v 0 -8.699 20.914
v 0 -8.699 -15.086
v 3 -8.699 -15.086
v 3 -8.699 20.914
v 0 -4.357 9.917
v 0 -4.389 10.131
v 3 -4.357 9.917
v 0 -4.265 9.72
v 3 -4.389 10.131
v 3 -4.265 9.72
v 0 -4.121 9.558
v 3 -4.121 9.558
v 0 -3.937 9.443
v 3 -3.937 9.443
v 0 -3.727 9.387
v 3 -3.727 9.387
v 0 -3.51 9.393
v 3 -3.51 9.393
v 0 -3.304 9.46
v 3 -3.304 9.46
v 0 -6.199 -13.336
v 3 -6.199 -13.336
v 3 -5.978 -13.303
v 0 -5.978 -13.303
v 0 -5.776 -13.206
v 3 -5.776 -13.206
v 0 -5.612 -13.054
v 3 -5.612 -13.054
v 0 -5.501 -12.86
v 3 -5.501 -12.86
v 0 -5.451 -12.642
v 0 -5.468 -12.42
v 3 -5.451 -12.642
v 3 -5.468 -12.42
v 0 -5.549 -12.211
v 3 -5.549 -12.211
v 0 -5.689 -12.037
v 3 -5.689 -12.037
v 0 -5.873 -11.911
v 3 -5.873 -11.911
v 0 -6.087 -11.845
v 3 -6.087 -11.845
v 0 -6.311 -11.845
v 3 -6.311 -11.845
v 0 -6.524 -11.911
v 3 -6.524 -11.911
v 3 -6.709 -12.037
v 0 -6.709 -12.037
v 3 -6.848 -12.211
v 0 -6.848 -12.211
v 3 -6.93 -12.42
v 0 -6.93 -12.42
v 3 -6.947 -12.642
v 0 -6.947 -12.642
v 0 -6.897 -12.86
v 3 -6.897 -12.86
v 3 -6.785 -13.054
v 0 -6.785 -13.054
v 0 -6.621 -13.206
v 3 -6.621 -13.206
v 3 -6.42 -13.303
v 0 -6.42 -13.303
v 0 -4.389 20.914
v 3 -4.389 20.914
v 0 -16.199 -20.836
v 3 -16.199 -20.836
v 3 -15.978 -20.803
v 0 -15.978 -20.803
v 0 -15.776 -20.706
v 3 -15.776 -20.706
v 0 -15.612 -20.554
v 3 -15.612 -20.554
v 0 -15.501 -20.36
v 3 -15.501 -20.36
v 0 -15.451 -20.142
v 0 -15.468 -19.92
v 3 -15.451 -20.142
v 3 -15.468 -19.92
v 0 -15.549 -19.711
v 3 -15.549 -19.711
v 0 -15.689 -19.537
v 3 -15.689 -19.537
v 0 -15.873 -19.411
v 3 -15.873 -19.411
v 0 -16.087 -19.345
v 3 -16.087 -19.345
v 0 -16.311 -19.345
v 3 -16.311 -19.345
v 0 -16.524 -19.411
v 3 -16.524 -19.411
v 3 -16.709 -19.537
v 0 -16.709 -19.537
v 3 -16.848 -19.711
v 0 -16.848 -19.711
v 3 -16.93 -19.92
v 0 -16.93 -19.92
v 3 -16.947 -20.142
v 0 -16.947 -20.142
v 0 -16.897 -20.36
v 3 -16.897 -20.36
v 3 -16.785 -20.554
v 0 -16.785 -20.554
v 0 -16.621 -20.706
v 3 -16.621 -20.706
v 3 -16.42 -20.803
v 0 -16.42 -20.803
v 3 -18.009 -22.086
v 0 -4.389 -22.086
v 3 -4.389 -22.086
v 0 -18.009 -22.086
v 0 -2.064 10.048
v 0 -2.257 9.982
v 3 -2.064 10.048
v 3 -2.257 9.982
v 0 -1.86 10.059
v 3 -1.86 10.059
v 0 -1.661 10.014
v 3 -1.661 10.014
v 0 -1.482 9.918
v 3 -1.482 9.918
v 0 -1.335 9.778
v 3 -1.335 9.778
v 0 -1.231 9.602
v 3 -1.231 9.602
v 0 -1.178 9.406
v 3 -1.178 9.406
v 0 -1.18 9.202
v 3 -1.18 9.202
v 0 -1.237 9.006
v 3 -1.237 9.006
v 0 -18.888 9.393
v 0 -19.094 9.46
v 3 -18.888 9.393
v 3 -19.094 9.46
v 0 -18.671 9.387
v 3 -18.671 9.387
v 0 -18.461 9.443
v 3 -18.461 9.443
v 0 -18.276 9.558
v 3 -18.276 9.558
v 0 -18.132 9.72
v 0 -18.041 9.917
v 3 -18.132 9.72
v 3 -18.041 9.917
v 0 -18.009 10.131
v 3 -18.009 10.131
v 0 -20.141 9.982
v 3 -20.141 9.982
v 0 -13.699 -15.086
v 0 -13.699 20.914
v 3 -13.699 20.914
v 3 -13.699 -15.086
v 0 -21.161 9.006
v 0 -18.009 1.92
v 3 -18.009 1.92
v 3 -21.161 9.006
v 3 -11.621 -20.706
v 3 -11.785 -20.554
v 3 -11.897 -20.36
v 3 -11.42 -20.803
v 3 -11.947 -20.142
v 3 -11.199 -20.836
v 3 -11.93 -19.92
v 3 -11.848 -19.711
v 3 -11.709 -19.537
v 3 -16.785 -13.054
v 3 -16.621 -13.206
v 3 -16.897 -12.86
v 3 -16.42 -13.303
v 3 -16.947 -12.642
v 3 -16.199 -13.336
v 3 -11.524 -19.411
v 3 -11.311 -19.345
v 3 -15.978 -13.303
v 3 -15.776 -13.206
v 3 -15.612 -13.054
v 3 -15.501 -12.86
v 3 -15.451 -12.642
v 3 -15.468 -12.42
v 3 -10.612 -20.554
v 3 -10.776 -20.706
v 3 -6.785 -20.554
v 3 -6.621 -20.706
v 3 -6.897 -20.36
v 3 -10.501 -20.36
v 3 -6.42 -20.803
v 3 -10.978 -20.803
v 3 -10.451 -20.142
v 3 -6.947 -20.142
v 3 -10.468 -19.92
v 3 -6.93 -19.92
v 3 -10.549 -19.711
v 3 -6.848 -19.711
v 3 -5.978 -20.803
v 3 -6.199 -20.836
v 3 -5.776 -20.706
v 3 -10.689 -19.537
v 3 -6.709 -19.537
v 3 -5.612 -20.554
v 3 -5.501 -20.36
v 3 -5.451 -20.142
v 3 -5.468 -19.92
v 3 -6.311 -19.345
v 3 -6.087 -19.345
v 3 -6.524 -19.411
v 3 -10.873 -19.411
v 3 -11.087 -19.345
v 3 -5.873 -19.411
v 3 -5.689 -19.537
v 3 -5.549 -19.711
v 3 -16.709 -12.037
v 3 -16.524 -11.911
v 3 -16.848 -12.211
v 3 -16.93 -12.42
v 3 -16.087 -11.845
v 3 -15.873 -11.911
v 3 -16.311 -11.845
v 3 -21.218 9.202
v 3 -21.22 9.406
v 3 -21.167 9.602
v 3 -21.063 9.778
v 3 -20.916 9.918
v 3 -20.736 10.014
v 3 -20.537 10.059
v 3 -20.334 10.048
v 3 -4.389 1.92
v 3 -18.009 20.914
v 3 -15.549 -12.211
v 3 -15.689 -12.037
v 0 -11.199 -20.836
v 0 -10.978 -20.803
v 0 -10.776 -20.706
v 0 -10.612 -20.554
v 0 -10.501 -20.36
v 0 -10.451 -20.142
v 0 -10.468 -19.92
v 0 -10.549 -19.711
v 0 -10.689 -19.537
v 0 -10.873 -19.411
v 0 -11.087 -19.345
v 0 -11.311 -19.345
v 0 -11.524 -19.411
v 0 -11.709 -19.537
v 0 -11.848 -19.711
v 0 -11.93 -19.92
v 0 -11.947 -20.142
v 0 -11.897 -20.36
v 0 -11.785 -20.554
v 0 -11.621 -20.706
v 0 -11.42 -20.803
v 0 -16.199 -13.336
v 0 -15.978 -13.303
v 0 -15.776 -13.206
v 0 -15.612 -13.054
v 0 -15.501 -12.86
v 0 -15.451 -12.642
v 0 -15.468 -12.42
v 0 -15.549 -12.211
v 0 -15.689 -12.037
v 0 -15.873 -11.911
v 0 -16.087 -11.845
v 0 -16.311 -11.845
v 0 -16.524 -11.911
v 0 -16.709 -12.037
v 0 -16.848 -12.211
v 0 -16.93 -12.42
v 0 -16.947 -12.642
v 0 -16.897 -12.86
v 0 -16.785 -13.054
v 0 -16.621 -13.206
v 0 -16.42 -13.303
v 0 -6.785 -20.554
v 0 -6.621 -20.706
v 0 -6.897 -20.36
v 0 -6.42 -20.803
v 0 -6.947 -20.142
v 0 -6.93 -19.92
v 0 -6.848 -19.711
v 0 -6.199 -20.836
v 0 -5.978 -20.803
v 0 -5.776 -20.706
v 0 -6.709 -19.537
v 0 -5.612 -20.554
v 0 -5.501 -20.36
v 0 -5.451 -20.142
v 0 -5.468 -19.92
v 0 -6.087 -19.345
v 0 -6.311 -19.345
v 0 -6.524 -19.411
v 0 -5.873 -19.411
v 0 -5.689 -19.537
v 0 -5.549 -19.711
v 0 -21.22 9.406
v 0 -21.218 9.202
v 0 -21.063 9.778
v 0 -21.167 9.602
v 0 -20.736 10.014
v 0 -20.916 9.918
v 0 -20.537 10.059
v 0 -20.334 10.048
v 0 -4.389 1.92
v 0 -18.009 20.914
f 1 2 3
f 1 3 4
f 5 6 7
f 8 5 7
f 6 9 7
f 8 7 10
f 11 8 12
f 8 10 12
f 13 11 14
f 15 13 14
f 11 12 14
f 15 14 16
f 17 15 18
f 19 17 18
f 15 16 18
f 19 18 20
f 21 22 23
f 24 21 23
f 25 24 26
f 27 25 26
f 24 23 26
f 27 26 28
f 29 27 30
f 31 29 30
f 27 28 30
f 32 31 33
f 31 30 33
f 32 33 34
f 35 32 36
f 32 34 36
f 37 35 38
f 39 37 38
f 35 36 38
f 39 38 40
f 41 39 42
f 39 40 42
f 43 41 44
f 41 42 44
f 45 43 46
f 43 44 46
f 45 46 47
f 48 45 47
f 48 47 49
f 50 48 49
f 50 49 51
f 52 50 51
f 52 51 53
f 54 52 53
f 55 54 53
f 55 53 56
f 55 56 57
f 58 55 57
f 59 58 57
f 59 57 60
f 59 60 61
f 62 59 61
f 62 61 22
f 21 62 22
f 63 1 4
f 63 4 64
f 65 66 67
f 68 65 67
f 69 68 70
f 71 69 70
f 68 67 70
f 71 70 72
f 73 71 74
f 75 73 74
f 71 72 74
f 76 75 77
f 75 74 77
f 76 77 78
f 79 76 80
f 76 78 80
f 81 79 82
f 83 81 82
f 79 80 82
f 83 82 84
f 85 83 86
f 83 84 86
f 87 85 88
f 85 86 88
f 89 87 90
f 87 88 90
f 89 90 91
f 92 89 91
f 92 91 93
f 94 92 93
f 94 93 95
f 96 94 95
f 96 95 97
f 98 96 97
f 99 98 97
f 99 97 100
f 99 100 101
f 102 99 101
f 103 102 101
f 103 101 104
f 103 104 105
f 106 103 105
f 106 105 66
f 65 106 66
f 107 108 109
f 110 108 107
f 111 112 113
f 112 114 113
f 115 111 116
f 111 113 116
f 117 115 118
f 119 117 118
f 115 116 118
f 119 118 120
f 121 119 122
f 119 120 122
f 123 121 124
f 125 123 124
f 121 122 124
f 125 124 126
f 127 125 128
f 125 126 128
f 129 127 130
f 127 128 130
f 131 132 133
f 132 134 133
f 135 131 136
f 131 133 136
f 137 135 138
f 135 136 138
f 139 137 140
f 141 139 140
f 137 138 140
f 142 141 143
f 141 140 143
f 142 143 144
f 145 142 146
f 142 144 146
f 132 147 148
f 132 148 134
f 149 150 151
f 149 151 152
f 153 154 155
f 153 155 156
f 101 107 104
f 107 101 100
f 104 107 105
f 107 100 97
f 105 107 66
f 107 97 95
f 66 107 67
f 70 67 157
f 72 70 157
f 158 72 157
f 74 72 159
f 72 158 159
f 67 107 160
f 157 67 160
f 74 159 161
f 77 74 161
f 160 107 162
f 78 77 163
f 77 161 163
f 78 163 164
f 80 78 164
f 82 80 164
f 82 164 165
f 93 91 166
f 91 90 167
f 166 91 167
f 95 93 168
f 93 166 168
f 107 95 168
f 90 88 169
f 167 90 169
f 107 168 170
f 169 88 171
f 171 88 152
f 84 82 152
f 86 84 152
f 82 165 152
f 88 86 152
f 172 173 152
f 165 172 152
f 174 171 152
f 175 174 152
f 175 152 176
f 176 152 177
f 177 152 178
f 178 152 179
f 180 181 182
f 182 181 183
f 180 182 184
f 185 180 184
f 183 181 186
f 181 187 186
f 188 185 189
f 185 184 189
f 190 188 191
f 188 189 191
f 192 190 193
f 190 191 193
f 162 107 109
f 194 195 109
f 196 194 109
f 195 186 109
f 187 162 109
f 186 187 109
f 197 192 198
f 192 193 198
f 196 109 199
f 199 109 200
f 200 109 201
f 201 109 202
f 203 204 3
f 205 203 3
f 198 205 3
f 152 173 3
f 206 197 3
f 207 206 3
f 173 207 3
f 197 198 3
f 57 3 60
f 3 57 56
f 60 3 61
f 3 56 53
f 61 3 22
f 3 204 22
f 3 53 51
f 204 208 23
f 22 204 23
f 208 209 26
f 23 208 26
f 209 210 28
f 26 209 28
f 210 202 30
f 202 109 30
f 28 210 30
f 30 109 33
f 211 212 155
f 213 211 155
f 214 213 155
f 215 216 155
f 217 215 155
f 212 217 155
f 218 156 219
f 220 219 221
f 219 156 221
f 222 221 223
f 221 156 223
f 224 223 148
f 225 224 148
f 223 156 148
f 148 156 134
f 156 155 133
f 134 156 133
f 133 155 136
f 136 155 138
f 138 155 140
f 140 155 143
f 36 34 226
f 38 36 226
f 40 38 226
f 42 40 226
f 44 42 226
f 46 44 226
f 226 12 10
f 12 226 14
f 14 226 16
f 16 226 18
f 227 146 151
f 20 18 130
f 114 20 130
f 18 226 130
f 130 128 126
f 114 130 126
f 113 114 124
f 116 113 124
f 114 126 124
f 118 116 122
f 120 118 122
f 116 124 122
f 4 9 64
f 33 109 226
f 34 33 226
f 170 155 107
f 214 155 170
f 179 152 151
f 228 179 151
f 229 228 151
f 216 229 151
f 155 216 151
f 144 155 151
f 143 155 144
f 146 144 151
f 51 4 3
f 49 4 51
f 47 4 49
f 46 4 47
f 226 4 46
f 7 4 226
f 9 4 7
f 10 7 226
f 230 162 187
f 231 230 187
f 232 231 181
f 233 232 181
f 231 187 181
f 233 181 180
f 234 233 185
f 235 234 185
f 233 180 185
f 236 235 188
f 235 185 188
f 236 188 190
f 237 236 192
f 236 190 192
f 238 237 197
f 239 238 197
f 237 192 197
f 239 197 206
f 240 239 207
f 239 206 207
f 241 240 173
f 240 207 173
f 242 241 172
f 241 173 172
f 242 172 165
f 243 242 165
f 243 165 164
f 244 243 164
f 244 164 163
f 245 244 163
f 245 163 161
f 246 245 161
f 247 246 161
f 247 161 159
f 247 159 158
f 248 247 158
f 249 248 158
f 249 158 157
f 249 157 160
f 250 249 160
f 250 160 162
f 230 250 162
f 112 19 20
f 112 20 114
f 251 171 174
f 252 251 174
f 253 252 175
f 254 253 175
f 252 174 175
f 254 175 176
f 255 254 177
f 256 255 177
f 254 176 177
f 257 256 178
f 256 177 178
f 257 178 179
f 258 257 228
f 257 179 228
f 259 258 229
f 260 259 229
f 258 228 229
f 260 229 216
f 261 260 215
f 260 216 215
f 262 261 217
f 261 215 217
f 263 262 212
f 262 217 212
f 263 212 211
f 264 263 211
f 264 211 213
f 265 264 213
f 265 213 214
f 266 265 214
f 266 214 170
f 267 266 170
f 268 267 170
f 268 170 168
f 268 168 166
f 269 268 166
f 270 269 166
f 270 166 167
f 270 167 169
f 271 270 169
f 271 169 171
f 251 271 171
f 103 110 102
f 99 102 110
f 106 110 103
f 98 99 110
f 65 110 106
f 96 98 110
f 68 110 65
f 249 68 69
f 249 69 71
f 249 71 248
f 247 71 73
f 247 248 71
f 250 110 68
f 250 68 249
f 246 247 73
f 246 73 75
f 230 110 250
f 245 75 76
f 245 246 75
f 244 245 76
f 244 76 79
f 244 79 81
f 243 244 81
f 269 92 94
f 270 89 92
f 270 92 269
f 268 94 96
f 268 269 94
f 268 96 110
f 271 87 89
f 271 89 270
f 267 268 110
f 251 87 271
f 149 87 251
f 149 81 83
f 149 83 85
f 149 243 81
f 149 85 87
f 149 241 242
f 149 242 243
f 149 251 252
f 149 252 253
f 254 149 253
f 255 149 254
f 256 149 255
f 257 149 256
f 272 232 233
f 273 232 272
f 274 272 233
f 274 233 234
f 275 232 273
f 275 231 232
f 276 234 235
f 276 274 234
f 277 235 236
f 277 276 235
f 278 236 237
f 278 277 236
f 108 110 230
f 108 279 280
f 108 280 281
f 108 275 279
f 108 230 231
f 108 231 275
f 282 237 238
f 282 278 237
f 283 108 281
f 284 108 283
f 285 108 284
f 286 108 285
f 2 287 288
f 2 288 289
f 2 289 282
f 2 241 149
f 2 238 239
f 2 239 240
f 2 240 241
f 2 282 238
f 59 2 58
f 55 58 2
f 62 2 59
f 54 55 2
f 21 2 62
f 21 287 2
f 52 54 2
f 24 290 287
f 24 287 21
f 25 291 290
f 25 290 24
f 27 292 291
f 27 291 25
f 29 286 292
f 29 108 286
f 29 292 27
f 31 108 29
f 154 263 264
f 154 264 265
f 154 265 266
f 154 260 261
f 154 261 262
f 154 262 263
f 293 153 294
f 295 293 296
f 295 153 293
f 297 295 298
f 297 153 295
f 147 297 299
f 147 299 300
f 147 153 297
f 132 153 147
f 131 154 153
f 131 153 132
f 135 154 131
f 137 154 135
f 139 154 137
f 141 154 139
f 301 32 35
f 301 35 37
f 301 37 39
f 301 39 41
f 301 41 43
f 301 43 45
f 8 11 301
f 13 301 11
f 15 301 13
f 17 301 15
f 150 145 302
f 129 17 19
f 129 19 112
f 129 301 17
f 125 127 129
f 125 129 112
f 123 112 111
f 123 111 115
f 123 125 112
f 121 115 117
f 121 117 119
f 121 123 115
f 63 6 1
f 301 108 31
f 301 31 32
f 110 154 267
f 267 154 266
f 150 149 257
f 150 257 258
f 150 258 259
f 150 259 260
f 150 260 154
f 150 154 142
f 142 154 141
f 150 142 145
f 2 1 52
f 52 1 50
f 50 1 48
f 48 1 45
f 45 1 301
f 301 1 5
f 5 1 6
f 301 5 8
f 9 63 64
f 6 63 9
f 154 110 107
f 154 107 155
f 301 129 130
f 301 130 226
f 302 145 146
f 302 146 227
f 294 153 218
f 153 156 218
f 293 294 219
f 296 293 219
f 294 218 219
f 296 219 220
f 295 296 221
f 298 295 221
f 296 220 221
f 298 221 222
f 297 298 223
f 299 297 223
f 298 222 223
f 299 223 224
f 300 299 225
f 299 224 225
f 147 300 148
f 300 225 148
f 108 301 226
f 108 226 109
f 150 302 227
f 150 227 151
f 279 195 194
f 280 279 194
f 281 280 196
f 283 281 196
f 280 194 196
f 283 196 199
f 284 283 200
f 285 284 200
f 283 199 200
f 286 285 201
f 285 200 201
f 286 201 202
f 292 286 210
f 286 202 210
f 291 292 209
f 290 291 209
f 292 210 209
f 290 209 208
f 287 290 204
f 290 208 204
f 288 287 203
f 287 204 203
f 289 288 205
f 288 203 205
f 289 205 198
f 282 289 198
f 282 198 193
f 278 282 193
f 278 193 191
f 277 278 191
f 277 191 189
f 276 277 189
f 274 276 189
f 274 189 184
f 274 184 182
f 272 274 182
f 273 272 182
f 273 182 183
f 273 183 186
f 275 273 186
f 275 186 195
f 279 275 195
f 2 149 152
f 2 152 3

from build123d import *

# Parameters (mm, degrees)
BOSS_EXTRUDE1_DEPTH = 3
FILLET1_R           = 0.75
SKETCH3_R           = 0.75
CUT_EXTRUDE1_DEPTH  = 4


with BuildPart() as part:
    # Sketch2 → Boss-Extrude1 (new body)
    with BuildSketch(Plane(origin=(0, 0, 0), x_dir=(0, 0, -1), z_dir=(1, 0, 0))):
        Polygon((-20.913575794, -4.388518255), (-8.919601915, -4.388518255), (-10.913575794, -0.388518255), (-1.919601915, -4.388518255), (22.086424206, -4.388518255), (22.086424206, -18.00920791), (-1.919601915, -18.00920791), (-10.913575794, -22.00920791), (-8.919601915, -18.00920791), (-20.913575794, -18.00920791), (-20.913575794, -13.698863083), (15.086424206, -13.698863083), (15.086424206, -8.698863083), (-20.913575794, -8.698863083), align=None)
    extrude(amount=BOSS_EXTRUDE1_DEPTH)

    # Fillet1
    fillet1_edges = [part.edges().sort_by_distance(p)[0] for p in [
        (1.5, -4.388518255, 8.919601915),
        (1.5, -0.388518255, 10.913575794),
        (1.5, -22.00920791, 10.913575794),
        (1.5, -18.00920791, 8.919601915),
    ]]
    fillet(fillet1_edges, radius=FILLET1_R)

    # Sketch3 → Cut-Extrude1 (cut, through all)
    with BuildSketch(Plane(origin=(3, 0, 0), x_dir=(0, 0, -1), z_dir=(1, 0, 0))):
        with Locations((20.086424206, -6.198863083)):
            Circle(SKETCH3_R)
        with Locations((20.086424206, -16.198863083)):
            Circle(SKETCH3_R)
        with Locations((20.086424206, -11.198863083)):
            Circle(SKETCH3_R)
        with Locations((12.586424206, -6.198863083)):
            Circle(SKETCH3_R)
        with Locations((12.586424206, -16.198863083)):
            Circle(SKETCH3_R)
    extrude(amount=-CUT_EXTRUDE1_DEPTH, mode=Mode.SUBTRACT)


solid = part.part
